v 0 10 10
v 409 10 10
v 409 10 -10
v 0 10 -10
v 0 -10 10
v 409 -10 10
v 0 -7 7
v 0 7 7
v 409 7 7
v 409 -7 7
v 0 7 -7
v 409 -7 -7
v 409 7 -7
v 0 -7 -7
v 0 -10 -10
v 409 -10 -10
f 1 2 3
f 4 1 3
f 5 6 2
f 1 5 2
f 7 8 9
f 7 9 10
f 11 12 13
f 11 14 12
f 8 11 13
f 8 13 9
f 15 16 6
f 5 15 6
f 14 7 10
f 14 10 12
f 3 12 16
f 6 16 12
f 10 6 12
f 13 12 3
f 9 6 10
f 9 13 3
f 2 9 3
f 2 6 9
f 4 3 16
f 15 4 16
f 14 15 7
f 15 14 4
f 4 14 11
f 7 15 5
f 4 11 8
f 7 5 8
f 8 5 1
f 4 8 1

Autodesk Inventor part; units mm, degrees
ref_plane "YZ Plane" through (0, 0, 0) normal (1, 0, 0) x (0, 1, 0)
ref_plane "XZ Plane" through (0, 0, 0) normal (0, 1, 0) x (-1, 0, 0)
ref_plane "XY Plane" through (0, 0, 0) normal (0, 0, 1) x (1, 0, 0)
sketch "Sketch1" plane through (0, 0, 0) normal (1, 0, 0) x (0, 1, 0)
  line L0 (-10, 10) -> (10, 10)
  line L1 (10, 10) -> (10, -10)
  line L2 (10, -10) -> (-10, -10)
  line L3 (-10, -10) -> (-10, 10)
  line L4 (-10, 10) -> (10, -10) construction
  line L5 (10, 10) -> (-10, -10) construction
  line L6 (7, -7) -> (7, 7)
  line L7 (7, 7) -> (-7, 7)
  line L8 (-7, 7) -> (-7, -7)
  line L9 (-7, -7) -> (7, -7)
  point P0 (0, 0)
  dimension "d0" = 20
  dimension "d1" = 20
  dimension "d2" = 3
extrude "Extrusion1" add sketch "Sketch1" along normal blind 409
properties part number "2020 Extrusion Base"
